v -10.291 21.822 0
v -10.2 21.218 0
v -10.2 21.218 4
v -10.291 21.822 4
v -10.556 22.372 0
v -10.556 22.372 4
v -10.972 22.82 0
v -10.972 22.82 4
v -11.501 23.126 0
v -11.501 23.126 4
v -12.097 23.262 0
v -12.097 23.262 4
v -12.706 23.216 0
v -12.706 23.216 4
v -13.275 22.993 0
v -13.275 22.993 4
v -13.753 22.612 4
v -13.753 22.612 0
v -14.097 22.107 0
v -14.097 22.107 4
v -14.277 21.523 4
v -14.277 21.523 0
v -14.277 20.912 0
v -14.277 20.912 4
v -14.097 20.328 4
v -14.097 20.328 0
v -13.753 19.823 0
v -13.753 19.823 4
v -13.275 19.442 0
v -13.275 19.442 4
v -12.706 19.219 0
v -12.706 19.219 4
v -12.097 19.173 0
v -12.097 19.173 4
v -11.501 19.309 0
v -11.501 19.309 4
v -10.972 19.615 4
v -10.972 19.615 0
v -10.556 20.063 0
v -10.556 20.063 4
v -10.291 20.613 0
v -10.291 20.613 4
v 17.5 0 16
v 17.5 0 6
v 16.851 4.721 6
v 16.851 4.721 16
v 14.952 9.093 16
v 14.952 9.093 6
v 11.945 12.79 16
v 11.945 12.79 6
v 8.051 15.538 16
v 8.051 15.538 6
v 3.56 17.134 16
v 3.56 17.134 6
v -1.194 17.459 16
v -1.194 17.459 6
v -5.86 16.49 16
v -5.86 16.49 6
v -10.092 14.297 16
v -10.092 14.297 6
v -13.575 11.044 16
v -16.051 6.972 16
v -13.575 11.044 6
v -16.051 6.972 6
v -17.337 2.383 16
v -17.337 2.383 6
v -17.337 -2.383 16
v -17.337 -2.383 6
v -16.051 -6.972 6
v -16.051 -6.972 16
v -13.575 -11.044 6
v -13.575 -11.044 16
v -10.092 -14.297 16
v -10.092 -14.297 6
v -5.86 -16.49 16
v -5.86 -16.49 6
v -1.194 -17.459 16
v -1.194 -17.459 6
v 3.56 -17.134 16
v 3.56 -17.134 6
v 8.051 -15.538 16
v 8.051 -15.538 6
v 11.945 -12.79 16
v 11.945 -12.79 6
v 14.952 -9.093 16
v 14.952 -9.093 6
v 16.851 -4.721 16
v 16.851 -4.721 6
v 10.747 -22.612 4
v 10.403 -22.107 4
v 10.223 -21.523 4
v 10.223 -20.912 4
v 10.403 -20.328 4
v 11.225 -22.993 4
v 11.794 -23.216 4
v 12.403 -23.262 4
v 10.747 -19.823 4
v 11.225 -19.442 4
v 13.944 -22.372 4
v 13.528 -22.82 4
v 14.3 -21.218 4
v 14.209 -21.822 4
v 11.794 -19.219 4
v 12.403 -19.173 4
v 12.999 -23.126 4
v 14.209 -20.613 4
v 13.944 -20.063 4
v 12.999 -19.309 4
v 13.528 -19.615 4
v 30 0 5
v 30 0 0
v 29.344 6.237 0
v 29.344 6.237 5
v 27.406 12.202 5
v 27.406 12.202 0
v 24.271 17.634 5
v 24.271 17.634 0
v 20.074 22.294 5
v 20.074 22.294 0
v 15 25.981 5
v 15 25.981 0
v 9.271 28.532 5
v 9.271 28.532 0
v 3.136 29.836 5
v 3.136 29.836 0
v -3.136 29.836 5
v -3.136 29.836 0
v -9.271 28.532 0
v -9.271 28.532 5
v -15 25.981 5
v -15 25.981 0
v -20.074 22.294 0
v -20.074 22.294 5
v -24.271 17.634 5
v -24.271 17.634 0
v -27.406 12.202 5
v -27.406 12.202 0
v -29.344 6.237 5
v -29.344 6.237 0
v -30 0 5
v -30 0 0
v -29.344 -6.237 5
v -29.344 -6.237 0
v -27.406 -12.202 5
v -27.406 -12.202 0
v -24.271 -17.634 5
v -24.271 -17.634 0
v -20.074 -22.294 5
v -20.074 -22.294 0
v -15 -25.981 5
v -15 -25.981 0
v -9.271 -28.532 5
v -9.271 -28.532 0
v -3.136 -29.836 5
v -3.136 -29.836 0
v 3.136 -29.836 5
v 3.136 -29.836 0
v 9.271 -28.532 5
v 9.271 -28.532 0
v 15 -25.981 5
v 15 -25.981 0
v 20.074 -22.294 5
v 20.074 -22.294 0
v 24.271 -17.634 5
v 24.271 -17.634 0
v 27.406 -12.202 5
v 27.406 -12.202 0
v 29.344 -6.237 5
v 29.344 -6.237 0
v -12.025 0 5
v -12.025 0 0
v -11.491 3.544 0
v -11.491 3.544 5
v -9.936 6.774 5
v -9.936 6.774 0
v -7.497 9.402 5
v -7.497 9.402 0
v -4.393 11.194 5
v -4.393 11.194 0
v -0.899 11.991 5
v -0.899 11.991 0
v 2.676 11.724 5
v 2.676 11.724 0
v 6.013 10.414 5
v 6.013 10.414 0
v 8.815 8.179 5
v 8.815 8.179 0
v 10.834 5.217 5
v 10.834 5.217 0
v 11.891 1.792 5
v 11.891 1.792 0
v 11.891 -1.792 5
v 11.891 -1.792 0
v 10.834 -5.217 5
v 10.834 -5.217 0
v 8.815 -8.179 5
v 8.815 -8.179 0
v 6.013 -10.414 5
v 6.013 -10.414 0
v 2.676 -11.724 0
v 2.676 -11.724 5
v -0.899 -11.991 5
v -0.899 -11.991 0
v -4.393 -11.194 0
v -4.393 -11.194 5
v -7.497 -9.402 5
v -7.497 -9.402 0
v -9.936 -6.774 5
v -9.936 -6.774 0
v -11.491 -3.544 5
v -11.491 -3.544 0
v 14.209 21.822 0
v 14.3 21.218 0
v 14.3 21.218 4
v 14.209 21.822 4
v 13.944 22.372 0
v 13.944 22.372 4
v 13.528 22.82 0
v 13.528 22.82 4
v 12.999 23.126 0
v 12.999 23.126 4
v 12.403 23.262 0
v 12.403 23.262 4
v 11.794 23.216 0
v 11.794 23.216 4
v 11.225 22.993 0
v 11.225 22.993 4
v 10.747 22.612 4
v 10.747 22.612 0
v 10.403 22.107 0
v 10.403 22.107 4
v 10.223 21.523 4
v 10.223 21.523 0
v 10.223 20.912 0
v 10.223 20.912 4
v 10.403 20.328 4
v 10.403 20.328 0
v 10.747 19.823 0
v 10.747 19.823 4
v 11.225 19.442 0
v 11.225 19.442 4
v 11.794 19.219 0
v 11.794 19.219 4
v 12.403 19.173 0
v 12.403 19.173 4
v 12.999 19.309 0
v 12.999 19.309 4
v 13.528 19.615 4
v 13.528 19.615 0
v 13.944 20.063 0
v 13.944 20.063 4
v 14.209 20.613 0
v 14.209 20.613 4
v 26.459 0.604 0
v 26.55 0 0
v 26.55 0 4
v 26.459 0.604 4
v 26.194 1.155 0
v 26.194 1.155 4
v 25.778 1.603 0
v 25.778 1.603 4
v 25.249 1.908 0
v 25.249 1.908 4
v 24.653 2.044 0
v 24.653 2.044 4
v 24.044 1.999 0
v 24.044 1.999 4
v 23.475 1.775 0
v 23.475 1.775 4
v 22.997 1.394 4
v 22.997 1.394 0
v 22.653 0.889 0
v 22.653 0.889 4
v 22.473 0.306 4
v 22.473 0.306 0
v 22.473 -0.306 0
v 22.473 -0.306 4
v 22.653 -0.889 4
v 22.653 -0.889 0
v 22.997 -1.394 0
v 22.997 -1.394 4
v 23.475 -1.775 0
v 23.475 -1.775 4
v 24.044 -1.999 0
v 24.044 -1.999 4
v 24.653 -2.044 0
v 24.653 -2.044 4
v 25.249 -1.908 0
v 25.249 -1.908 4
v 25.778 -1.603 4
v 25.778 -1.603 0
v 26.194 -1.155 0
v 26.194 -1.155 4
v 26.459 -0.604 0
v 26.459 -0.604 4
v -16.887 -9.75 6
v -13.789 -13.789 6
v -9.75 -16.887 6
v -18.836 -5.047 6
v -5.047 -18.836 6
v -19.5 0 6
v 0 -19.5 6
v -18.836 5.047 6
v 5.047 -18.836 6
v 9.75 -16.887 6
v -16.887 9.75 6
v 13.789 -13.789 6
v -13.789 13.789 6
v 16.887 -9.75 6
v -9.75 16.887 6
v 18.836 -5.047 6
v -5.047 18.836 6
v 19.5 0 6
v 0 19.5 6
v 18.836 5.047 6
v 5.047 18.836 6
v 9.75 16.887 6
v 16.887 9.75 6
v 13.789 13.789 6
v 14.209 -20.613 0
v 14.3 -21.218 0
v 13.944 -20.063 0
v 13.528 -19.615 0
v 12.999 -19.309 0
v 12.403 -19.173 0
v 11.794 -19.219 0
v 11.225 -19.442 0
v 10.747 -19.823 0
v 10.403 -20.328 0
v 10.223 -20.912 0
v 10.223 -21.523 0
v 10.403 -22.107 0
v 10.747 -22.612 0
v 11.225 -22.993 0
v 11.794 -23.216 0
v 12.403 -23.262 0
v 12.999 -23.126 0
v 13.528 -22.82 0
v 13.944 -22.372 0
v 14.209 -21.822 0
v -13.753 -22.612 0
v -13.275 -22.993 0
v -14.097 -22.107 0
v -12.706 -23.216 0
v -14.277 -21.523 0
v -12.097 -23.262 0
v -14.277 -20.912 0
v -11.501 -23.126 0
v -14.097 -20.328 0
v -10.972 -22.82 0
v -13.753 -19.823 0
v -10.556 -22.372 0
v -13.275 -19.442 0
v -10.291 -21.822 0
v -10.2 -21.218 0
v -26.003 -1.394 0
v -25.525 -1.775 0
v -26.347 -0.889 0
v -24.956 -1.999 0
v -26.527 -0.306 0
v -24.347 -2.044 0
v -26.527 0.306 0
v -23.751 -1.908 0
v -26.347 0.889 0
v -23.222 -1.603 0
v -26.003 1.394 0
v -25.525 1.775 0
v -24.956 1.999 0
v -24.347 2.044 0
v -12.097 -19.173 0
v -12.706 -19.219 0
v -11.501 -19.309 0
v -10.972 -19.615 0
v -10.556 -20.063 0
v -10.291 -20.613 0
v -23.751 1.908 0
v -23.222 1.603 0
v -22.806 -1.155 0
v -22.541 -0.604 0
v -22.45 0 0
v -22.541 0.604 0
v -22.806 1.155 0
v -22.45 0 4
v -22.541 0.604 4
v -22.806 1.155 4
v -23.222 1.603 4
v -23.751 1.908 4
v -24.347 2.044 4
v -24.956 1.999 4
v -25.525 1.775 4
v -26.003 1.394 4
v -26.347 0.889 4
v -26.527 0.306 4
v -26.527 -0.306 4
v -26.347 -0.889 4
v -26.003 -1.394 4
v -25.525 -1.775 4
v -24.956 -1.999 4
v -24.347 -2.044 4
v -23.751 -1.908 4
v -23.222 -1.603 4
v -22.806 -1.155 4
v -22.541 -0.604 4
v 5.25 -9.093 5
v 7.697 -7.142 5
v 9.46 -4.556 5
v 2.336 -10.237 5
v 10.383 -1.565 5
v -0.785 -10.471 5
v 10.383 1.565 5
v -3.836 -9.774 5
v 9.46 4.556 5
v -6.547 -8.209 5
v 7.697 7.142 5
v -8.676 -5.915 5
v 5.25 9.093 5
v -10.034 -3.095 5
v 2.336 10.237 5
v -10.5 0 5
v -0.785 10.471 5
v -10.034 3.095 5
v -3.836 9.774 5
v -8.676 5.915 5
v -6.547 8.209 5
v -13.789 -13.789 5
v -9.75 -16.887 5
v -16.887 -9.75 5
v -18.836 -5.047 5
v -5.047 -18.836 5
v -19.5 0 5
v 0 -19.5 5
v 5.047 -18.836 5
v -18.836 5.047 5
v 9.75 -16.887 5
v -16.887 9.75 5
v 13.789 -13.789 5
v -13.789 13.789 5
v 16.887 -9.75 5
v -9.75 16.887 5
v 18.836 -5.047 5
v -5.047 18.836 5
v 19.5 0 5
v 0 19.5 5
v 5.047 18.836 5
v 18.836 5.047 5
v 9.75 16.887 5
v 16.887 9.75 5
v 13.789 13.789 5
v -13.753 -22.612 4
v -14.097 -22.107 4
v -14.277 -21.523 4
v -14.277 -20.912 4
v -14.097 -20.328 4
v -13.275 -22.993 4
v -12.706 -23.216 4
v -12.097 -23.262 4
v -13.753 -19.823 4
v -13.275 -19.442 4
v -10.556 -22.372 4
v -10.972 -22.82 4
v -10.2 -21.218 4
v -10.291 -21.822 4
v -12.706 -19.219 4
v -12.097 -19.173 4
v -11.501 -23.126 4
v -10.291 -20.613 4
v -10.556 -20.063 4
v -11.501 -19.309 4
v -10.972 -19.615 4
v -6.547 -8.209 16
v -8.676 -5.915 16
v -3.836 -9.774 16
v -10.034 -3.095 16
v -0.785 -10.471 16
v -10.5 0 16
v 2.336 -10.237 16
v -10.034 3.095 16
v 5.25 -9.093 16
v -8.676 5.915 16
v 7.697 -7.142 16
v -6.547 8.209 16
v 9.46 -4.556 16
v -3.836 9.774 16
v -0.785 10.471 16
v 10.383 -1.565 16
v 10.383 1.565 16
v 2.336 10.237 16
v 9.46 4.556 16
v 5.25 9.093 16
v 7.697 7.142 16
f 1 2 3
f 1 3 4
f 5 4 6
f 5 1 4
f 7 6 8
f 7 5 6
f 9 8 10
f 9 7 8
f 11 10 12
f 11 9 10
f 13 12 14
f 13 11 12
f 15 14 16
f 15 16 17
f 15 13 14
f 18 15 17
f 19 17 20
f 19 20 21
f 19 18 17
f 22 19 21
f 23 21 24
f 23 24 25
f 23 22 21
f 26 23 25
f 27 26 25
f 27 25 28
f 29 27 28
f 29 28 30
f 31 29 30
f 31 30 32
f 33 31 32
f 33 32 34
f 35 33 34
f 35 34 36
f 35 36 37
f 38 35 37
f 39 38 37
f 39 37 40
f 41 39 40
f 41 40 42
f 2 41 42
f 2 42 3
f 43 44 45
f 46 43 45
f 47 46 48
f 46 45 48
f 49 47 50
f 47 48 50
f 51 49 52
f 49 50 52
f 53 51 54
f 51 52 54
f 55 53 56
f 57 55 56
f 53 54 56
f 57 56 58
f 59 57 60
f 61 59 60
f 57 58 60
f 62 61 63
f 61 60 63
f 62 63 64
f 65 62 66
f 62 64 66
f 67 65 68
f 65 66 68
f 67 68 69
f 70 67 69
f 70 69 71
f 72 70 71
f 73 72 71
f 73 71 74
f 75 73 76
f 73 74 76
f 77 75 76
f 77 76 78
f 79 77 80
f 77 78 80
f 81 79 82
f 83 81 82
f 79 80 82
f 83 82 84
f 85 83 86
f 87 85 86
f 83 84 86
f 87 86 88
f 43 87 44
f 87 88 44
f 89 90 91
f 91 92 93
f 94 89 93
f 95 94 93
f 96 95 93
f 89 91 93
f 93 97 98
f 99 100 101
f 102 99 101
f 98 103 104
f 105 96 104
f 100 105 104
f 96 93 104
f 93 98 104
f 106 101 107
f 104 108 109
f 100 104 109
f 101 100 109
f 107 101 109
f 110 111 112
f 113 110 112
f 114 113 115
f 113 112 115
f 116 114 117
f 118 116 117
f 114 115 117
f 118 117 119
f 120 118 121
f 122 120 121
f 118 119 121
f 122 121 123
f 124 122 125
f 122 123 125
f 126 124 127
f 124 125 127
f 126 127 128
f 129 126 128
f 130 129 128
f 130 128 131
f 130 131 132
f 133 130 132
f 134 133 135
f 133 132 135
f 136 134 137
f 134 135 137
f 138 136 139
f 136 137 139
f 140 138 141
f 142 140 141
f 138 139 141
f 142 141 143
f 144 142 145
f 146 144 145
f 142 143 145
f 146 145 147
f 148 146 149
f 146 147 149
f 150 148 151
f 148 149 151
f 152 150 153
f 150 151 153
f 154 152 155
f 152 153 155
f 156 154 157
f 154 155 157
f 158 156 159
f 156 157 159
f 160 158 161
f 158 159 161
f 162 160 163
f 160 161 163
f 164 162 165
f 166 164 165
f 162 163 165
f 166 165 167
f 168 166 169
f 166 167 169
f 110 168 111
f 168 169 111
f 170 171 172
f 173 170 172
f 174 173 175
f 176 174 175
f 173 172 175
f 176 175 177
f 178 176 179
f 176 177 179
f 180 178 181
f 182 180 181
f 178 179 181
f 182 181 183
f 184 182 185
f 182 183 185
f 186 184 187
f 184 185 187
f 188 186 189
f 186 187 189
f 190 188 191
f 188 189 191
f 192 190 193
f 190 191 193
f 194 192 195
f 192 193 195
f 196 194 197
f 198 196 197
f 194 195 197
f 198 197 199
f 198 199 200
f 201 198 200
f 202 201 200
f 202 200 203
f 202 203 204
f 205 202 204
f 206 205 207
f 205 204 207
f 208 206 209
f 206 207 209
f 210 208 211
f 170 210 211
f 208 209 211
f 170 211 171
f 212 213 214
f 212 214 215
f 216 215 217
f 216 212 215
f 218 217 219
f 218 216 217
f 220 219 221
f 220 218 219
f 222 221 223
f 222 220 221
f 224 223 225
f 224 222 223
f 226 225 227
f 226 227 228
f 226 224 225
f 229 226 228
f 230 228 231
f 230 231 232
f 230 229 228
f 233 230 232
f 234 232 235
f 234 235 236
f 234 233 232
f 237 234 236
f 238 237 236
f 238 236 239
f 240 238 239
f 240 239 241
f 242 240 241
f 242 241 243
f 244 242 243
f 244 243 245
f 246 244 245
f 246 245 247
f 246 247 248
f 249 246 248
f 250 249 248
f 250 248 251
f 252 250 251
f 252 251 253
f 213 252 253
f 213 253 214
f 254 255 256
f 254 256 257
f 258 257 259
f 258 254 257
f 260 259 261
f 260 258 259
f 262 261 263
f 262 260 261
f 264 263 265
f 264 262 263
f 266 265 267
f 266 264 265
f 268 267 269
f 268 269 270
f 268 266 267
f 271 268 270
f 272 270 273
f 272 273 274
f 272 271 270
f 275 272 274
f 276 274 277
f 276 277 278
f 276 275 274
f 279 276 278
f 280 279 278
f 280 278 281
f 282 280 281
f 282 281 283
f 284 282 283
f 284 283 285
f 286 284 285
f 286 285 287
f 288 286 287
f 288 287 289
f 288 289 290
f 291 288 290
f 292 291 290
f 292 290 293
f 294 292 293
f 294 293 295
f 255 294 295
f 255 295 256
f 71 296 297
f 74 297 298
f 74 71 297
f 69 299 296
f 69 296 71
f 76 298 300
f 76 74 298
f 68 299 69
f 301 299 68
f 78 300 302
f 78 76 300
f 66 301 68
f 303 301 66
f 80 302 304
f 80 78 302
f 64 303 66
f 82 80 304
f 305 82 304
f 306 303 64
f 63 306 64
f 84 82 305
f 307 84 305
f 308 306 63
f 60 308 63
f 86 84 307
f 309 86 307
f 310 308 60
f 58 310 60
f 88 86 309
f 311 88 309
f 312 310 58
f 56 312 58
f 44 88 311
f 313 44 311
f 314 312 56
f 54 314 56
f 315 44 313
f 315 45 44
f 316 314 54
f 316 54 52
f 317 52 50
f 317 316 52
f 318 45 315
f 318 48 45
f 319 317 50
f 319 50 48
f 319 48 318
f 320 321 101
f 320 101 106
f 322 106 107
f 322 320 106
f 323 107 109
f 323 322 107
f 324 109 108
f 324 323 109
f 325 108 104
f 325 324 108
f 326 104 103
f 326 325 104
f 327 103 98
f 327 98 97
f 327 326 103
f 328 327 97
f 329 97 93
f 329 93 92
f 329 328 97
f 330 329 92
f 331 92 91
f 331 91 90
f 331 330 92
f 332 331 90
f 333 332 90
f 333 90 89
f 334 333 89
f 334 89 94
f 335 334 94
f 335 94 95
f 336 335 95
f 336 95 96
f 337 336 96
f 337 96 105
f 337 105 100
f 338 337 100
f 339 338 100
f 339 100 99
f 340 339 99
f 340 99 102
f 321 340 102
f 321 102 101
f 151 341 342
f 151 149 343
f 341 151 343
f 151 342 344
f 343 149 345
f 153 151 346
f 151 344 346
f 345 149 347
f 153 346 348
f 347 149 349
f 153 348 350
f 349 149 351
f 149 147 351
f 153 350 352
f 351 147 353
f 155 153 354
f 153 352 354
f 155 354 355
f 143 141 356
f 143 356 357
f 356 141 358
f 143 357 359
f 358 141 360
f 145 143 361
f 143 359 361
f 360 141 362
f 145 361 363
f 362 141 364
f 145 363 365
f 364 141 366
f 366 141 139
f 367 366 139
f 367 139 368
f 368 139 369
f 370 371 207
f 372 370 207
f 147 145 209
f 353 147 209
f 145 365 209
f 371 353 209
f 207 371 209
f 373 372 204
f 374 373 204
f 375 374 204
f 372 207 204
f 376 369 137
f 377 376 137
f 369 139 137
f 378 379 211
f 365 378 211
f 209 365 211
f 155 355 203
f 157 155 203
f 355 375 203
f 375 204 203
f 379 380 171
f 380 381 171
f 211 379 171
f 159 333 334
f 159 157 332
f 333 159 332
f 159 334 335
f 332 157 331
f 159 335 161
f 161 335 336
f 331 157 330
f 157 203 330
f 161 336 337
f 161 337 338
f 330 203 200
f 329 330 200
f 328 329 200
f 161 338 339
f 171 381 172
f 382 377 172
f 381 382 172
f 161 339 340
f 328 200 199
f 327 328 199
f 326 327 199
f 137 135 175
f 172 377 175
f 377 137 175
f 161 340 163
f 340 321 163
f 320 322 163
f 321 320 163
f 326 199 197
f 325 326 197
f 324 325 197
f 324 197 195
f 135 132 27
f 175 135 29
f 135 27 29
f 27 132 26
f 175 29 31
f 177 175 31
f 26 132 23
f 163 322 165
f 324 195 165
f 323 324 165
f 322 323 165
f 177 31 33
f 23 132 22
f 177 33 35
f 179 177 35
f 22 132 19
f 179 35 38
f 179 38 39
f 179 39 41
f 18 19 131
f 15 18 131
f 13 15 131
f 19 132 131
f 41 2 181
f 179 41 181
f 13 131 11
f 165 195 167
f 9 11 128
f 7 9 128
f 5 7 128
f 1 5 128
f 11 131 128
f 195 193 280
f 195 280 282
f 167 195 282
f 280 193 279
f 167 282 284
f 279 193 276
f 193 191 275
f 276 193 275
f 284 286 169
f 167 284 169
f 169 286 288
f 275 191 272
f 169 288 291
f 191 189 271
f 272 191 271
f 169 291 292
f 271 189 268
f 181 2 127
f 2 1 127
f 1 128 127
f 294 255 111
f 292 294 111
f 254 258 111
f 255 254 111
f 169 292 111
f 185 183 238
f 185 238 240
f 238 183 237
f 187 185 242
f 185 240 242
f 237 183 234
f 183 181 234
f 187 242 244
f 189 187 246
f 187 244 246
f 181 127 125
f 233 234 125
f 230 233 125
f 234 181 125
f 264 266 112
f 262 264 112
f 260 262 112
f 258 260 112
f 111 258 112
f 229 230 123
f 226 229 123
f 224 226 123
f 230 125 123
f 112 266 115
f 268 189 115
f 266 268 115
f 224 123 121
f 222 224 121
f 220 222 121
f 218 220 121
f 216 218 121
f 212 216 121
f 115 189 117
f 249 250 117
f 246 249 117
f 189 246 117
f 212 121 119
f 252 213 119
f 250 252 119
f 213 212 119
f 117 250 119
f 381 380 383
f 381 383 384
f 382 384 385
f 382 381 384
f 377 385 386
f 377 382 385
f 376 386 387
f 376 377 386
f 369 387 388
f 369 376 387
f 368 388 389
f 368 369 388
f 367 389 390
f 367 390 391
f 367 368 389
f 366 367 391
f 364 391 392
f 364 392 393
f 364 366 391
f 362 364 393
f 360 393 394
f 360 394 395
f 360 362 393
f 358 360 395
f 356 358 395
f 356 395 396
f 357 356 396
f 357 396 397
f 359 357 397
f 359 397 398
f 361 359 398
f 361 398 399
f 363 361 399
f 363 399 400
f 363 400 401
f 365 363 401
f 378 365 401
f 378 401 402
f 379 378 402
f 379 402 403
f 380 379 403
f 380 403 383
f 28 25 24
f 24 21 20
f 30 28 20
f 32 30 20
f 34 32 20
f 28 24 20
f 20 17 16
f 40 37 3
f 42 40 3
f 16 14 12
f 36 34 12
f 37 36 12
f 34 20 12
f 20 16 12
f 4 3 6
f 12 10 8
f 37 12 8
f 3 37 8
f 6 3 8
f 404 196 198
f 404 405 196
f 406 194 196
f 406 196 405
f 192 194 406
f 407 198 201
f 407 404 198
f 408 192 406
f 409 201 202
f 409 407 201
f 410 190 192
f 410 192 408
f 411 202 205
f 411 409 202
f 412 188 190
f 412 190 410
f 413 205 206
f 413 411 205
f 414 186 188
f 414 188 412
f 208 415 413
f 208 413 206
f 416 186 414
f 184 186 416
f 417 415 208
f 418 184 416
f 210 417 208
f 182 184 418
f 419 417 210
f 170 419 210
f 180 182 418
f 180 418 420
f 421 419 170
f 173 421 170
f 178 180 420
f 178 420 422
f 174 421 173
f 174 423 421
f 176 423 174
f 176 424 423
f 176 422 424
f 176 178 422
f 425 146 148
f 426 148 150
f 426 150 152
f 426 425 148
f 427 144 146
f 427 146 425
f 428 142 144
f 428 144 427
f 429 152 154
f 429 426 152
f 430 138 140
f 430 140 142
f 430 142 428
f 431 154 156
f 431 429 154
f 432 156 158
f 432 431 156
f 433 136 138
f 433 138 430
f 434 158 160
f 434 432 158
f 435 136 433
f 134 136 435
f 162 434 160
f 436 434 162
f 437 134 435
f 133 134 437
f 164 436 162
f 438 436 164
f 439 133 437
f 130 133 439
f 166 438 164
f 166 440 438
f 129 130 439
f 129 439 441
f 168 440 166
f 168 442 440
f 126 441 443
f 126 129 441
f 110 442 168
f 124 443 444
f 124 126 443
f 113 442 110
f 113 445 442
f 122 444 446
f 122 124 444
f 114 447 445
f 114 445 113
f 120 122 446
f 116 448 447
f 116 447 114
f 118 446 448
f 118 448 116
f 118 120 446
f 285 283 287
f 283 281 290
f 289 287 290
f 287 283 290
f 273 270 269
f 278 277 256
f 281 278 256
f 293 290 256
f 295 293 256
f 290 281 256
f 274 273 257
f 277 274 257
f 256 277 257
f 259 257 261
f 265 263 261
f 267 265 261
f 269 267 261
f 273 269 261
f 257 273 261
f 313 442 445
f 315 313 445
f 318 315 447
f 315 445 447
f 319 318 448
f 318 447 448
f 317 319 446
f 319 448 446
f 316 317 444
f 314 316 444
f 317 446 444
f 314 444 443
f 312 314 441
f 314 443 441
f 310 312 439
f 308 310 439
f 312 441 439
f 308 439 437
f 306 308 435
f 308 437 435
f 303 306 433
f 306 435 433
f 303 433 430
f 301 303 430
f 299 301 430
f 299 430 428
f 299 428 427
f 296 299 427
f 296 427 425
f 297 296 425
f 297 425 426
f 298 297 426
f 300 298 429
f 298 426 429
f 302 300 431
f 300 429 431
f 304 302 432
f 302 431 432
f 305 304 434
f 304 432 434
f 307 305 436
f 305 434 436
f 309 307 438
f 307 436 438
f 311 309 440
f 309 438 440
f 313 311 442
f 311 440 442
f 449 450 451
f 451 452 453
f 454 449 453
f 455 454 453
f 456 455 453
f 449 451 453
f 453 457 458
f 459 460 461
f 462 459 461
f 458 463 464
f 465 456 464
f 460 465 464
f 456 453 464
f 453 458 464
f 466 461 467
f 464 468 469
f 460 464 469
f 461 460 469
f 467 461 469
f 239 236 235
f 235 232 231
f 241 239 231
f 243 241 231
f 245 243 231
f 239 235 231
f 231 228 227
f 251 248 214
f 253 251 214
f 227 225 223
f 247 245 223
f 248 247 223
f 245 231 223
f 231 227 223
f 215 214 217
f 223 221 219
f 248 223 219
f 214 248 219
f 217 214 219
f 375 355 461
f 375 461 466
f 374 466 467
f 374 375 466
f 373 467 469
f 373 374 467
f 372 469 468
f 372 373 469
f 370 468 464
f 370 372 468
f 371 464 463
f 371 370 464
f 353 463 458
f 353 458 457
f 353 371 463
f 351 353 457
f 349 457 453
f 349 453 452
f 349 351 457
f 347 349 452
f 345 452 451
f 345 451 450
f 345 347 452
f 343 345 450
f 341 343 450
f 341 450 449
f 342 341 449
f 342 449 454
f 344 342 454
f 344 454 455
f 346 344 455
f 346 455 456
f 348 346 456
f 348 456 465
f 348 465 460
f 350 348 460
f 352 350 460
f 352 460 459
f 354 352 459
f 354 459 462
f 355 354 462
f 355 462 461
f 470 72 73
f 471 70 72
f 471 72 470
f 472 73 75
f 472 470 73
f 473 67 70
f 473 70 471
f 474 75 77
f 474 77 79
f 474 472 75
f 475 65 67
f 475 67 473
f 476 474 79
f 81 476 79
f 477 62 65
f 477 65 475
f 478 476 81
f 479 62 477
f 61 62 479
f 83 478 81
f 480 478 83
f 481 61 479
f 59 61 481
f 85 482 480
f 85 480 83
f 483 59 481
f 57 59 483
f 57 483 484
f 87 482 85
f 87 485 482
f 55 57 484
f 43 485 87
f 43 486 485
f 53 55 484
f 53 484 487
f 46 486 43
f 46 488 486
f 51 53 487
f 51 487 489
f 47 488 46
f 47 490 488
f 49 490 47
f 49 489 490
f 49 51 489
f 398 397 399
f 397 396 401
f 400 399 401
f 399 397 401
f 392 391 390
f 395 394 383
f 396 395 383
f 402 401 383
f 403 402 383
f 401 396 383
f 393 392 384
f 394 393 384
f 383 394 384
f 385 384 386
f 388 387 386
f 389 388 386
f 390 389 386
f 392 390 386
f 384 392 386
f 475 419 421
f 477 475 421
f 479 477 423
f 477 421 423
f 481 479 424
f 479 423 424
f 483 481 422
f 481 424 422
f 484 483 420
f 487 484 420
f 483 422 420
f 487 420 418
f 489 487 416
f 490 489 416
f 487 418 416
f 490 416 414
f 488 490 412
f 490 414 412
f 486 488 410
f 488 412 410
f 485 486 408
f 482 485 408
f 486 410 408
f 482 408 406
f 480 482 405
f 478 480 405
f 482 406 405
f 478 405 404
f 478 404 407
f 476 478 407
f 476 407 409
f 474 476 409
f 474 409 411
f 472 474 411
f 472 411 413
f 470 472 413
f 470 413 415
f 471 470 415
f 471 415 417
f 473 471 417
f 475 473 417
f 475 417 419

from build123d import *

# Parameters (mm, degrees)
SKETCH1_R               = 30
BOSS_EXTRUDE1_DEPTH     = 5
SKETCH2_R               = 19.5
BOSS_EXTRUDE2_DEPTH     = 1
SKETCH3_R               = 17.5
BOSS_EXTRUDE3_DEPTH     = 10
CUT_EXTRUDE1_DEPTH      = 4
CUT_EXTRUDE1_DEPTH_BACK = 4
CUT_EXTRUDE1_START      = -5
SKETCH5_R               = 2.05
SKETCH9_R               = 5.5
CUT_EXTRUDE5_DEPTH      = 4
SKETCH7_R               = 12.025
CUT_EXTRUDE3_DEPTH      = 5
SKETCH8_R               = 10.5
CUT_EXTRUDE4_DEPTH      = 44.829214002


with BuildPart() as part:
    # Sketch1 → Boss-Extrude1 (new body)
    with BuildSketch(Plane.XY):
        Circle(SKETCH1_R)
    extrude(amount=BOSS_EXTRUDE1_DEPTH)

    # Sketch2 → Boss-Extrude2 (add)
    with BuildSketch(Plane.XY.offset(5)):
        Circle(SKETCH2_R)
    extrude(amount=BOSS_EXTRUDE2_DEPTH)

    # Sketch3 → Boss-Extrude3 (add)
    with BuildSketch(Plane.XY.offset(6)):
        Circle(SKETCH3_R)
    extrude(amount=BOSS_EXTRUDE3_DEPTH)

    # Sketch5 → Cut-Extrude1 (cut, two sides: drawn at the far end of the back side and taken through both)
    with BuildSketch(Plane.XY.offset(5).offset(CUT_EXTRUDE1_START - CUT_EXTRUDE1_DEPTH_BACK)):
        with Locations((24.5, 0)):
            Circle(SKETCH5_R)
        with Locations((12.25, -21.217622393)):
            Circle(SKETCH5_R)
        with Locations((-12.25, -21.217622393)):
            Circle(SKETCH5_R)
        with Locations((-24.5, 0)):
            Circle(SKETCH5_R)
        with Locations((-12.25, 21.217622393)):
            Circle(SKETCH5_R)
        with Locations((12.25, 21.217622393)):
            Circle(SKETCH5_R)
    extrude(amount=CUT_EXTRUDE1_DEPTH + CUT_EXTRUDE1_DEPTH_BACK, mode=Mode.SUBTRACT)

    # Sketch9 → Cut-Extrude5 (cut)
    with BuildSketch(Plane(origin=(0, 0, 0), x_dir=(-1, 0, 0), z_dir=(0, 0, -1))):
        Circle(SKETCH9_R)
    extrude(amount=-CUT_EXTRUDE5_DEPTH, mode=Mode.SUBTRACT)

    # Sketch7 → Cut-Extrude3 (cut)
    with BuildSketch(Plane(origin=(0, 0, 0), x_dir=(-1, 0, 0), z_dir=(0, 0, -1))):
        Circle(SKETCH7_R)
    extrude(amount=-CUT_EXTRUDE3_DEPTH, mode=Mode.SUBTRACT)

    # Sketch8 → Cut-Extrude4 (cut, through all)
    with BuildSketch(Plane(origin=(0, 0, 5), x_dir=(-1, 0, 0), z_dir=(0, 0, -1))):
        Circle(SKETCH8_R)
    extrude(amount=-CUT_EXTRUDE4_DEPTH, mode=Mode.SUBTRACT)


solid = part.part
